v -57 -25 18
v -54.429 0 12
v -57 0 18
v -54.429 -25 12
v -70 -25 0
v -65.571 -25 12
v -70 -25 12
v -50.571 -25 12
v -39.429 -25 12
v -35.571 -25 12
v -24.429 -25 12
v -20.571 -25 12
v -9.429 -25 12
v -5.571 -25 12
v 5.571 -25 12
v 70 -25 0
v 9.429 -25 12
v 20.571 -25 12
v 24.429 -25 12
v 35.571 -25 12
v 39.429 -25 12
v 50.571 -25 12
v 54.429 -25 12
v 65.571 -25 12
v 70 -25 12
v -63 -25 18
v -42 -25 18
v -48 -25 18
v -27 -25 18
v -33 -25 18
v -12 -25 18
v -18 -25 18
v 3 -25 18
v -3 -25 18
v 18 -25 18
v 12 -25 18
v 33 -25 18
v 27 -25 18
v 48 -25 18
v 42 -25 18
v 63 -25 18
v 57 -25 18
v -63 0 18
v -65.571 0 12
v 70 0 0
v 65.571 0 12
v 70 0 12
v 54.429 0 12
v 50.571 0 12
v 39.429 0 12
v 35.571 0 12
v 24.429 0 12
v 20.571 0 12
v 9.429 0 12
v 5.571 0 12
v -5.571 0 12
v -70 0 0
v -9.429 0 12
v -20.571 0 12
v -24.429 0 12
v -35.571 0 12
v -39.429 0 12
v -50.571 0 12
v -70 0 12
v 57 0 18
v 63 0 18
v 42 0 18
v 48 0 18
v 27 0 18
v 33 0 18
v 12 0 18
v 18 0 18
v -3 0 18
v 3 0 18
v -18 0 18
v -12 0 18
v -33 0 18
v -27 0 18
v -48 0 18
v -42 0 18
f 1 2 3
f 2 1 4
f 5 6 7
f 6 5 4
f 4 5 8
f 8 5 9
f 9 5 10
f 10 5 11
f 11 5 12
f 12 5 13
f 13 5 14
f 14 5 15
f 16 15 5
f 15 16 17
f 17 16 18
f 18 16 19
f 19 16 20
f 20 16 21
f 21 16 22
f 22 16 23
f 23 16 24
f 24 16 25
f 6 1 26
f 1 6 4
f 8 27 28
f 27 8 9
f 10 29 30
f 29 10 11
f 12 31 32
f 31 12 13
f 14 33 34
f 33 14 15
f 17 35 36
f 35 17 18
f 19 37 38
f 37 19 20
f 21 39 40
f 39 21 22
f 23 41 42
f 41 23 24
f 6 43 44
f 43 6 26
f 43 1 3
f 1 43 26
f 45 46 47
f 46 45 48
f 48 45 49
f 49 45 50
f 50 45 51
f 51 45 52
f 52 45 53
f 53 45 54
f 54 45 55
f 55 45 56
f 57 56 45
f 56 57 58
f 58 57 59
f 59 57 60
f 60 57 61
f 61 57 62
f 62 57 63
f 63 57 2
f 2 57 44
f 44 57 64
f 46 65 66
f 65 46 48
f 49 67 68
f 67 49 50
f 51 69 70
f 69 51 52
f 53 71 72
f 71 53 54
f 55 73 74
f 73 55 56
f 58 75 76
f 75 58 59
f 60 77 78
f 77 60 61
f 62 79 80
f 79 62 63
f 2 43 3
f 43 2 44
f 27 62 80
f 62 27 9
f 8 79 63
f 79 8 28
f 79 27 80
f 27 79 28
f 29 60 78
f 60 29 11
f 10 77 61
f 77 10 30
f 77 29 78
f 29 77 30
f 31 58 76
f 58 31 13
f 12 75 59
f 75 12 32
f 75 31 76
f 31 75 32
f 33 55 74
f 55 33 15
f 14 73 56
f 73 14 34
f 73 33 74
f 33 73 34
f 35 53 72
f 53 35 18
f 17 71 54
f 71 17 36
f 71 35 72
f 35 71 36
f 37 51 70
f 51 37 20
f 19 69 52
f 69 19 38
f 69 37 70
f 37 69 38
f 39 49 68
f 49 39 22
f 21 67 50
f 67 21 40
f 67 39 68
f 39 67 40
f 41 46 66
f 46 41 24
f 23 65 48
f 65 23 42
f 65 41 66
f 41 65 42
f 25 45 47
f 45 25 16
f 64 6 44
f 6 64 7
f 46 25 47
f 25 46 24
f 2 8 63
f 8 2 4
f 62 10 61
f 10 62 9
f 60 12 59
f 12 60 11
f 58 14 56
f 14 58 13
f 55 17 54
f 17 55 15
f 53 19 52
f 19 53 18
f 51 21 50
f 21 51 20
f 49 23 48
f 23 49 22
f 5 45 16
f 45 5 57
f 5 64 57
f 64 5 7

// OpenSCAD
$fn = 32;

// ----------------------------------------------------------------------
// Toothed rack, 9 teeth
// 15 mm pitch, 6 mm teeth
// ----------------------------------------------------------------------

// --- parameters (mm) ---
bar_w = 25;   // bar width (Y)
bar_h = 12;   // bar height (Z)
teeth = 9;    // number of teeth
pitch = 15;   // tooth pitch
tooth_h = 6;  // tooth height above the bar
root_w = 12;  // tooth width at the root
crest_w = 6;  // tooth width at the crest

// --- derived feature positions (mm) ---
span = (teeth - 1) * pitch;  // = 120   distance between the outer teeth
bar_l = span + root_w + 8;   // = 140   bar length: teeth plus 4 mm at each end
tooth_x = -span / 2;         // = -60   X of the first tooth
height = bar_h + tooth_h;    // = 18   overall height
feature_centers = [
  [tooth_x + 0 * pitch, -bar_w / 2],
  [tooth_x + 1 * pitch, -bar_w / 2],
  [tooth_x + 2 * pitch, -bar_w / 2],
  [tooth_x + 3 * pitch, -bar_w / 2],
  [tooth_x + 4 * pitch, -bar_w / 2],
  [tooth_x + 5 * pitch, -bar_w / 2],
  [tooth_x + 6 * pitch, -bar_w / 2],
  [tooth_x + 7 * pitch, -bar_w / 2],
  [tooth_x + 8 * pitch, -bar_w / 2]
];   // tooth centre line, drives the tooth loop

// bar with a rack of teeth, one extruded trapezoium per centre
module rack_tooth() {
  linear_extrude(height = bar_w)
    polygon(points = [
      [0, 0],
      [root_w, 0],
      [root_w / 2 + crest_w / 2, tooth_h + 1],
      [root_w / 2 - crest_w / 2, tooth_h + 1]
    ]);
}

union() {
  translate([-bar_l / 2, -bar_w, 0]) cube([bar_l, bar_w, bar_h]);
  for (centre = feature_centers)
    translate([centre[0] - root_w / 2, 0, bar_h - 1]) rotate([90, 0, 0]) rack_tooth();
}
